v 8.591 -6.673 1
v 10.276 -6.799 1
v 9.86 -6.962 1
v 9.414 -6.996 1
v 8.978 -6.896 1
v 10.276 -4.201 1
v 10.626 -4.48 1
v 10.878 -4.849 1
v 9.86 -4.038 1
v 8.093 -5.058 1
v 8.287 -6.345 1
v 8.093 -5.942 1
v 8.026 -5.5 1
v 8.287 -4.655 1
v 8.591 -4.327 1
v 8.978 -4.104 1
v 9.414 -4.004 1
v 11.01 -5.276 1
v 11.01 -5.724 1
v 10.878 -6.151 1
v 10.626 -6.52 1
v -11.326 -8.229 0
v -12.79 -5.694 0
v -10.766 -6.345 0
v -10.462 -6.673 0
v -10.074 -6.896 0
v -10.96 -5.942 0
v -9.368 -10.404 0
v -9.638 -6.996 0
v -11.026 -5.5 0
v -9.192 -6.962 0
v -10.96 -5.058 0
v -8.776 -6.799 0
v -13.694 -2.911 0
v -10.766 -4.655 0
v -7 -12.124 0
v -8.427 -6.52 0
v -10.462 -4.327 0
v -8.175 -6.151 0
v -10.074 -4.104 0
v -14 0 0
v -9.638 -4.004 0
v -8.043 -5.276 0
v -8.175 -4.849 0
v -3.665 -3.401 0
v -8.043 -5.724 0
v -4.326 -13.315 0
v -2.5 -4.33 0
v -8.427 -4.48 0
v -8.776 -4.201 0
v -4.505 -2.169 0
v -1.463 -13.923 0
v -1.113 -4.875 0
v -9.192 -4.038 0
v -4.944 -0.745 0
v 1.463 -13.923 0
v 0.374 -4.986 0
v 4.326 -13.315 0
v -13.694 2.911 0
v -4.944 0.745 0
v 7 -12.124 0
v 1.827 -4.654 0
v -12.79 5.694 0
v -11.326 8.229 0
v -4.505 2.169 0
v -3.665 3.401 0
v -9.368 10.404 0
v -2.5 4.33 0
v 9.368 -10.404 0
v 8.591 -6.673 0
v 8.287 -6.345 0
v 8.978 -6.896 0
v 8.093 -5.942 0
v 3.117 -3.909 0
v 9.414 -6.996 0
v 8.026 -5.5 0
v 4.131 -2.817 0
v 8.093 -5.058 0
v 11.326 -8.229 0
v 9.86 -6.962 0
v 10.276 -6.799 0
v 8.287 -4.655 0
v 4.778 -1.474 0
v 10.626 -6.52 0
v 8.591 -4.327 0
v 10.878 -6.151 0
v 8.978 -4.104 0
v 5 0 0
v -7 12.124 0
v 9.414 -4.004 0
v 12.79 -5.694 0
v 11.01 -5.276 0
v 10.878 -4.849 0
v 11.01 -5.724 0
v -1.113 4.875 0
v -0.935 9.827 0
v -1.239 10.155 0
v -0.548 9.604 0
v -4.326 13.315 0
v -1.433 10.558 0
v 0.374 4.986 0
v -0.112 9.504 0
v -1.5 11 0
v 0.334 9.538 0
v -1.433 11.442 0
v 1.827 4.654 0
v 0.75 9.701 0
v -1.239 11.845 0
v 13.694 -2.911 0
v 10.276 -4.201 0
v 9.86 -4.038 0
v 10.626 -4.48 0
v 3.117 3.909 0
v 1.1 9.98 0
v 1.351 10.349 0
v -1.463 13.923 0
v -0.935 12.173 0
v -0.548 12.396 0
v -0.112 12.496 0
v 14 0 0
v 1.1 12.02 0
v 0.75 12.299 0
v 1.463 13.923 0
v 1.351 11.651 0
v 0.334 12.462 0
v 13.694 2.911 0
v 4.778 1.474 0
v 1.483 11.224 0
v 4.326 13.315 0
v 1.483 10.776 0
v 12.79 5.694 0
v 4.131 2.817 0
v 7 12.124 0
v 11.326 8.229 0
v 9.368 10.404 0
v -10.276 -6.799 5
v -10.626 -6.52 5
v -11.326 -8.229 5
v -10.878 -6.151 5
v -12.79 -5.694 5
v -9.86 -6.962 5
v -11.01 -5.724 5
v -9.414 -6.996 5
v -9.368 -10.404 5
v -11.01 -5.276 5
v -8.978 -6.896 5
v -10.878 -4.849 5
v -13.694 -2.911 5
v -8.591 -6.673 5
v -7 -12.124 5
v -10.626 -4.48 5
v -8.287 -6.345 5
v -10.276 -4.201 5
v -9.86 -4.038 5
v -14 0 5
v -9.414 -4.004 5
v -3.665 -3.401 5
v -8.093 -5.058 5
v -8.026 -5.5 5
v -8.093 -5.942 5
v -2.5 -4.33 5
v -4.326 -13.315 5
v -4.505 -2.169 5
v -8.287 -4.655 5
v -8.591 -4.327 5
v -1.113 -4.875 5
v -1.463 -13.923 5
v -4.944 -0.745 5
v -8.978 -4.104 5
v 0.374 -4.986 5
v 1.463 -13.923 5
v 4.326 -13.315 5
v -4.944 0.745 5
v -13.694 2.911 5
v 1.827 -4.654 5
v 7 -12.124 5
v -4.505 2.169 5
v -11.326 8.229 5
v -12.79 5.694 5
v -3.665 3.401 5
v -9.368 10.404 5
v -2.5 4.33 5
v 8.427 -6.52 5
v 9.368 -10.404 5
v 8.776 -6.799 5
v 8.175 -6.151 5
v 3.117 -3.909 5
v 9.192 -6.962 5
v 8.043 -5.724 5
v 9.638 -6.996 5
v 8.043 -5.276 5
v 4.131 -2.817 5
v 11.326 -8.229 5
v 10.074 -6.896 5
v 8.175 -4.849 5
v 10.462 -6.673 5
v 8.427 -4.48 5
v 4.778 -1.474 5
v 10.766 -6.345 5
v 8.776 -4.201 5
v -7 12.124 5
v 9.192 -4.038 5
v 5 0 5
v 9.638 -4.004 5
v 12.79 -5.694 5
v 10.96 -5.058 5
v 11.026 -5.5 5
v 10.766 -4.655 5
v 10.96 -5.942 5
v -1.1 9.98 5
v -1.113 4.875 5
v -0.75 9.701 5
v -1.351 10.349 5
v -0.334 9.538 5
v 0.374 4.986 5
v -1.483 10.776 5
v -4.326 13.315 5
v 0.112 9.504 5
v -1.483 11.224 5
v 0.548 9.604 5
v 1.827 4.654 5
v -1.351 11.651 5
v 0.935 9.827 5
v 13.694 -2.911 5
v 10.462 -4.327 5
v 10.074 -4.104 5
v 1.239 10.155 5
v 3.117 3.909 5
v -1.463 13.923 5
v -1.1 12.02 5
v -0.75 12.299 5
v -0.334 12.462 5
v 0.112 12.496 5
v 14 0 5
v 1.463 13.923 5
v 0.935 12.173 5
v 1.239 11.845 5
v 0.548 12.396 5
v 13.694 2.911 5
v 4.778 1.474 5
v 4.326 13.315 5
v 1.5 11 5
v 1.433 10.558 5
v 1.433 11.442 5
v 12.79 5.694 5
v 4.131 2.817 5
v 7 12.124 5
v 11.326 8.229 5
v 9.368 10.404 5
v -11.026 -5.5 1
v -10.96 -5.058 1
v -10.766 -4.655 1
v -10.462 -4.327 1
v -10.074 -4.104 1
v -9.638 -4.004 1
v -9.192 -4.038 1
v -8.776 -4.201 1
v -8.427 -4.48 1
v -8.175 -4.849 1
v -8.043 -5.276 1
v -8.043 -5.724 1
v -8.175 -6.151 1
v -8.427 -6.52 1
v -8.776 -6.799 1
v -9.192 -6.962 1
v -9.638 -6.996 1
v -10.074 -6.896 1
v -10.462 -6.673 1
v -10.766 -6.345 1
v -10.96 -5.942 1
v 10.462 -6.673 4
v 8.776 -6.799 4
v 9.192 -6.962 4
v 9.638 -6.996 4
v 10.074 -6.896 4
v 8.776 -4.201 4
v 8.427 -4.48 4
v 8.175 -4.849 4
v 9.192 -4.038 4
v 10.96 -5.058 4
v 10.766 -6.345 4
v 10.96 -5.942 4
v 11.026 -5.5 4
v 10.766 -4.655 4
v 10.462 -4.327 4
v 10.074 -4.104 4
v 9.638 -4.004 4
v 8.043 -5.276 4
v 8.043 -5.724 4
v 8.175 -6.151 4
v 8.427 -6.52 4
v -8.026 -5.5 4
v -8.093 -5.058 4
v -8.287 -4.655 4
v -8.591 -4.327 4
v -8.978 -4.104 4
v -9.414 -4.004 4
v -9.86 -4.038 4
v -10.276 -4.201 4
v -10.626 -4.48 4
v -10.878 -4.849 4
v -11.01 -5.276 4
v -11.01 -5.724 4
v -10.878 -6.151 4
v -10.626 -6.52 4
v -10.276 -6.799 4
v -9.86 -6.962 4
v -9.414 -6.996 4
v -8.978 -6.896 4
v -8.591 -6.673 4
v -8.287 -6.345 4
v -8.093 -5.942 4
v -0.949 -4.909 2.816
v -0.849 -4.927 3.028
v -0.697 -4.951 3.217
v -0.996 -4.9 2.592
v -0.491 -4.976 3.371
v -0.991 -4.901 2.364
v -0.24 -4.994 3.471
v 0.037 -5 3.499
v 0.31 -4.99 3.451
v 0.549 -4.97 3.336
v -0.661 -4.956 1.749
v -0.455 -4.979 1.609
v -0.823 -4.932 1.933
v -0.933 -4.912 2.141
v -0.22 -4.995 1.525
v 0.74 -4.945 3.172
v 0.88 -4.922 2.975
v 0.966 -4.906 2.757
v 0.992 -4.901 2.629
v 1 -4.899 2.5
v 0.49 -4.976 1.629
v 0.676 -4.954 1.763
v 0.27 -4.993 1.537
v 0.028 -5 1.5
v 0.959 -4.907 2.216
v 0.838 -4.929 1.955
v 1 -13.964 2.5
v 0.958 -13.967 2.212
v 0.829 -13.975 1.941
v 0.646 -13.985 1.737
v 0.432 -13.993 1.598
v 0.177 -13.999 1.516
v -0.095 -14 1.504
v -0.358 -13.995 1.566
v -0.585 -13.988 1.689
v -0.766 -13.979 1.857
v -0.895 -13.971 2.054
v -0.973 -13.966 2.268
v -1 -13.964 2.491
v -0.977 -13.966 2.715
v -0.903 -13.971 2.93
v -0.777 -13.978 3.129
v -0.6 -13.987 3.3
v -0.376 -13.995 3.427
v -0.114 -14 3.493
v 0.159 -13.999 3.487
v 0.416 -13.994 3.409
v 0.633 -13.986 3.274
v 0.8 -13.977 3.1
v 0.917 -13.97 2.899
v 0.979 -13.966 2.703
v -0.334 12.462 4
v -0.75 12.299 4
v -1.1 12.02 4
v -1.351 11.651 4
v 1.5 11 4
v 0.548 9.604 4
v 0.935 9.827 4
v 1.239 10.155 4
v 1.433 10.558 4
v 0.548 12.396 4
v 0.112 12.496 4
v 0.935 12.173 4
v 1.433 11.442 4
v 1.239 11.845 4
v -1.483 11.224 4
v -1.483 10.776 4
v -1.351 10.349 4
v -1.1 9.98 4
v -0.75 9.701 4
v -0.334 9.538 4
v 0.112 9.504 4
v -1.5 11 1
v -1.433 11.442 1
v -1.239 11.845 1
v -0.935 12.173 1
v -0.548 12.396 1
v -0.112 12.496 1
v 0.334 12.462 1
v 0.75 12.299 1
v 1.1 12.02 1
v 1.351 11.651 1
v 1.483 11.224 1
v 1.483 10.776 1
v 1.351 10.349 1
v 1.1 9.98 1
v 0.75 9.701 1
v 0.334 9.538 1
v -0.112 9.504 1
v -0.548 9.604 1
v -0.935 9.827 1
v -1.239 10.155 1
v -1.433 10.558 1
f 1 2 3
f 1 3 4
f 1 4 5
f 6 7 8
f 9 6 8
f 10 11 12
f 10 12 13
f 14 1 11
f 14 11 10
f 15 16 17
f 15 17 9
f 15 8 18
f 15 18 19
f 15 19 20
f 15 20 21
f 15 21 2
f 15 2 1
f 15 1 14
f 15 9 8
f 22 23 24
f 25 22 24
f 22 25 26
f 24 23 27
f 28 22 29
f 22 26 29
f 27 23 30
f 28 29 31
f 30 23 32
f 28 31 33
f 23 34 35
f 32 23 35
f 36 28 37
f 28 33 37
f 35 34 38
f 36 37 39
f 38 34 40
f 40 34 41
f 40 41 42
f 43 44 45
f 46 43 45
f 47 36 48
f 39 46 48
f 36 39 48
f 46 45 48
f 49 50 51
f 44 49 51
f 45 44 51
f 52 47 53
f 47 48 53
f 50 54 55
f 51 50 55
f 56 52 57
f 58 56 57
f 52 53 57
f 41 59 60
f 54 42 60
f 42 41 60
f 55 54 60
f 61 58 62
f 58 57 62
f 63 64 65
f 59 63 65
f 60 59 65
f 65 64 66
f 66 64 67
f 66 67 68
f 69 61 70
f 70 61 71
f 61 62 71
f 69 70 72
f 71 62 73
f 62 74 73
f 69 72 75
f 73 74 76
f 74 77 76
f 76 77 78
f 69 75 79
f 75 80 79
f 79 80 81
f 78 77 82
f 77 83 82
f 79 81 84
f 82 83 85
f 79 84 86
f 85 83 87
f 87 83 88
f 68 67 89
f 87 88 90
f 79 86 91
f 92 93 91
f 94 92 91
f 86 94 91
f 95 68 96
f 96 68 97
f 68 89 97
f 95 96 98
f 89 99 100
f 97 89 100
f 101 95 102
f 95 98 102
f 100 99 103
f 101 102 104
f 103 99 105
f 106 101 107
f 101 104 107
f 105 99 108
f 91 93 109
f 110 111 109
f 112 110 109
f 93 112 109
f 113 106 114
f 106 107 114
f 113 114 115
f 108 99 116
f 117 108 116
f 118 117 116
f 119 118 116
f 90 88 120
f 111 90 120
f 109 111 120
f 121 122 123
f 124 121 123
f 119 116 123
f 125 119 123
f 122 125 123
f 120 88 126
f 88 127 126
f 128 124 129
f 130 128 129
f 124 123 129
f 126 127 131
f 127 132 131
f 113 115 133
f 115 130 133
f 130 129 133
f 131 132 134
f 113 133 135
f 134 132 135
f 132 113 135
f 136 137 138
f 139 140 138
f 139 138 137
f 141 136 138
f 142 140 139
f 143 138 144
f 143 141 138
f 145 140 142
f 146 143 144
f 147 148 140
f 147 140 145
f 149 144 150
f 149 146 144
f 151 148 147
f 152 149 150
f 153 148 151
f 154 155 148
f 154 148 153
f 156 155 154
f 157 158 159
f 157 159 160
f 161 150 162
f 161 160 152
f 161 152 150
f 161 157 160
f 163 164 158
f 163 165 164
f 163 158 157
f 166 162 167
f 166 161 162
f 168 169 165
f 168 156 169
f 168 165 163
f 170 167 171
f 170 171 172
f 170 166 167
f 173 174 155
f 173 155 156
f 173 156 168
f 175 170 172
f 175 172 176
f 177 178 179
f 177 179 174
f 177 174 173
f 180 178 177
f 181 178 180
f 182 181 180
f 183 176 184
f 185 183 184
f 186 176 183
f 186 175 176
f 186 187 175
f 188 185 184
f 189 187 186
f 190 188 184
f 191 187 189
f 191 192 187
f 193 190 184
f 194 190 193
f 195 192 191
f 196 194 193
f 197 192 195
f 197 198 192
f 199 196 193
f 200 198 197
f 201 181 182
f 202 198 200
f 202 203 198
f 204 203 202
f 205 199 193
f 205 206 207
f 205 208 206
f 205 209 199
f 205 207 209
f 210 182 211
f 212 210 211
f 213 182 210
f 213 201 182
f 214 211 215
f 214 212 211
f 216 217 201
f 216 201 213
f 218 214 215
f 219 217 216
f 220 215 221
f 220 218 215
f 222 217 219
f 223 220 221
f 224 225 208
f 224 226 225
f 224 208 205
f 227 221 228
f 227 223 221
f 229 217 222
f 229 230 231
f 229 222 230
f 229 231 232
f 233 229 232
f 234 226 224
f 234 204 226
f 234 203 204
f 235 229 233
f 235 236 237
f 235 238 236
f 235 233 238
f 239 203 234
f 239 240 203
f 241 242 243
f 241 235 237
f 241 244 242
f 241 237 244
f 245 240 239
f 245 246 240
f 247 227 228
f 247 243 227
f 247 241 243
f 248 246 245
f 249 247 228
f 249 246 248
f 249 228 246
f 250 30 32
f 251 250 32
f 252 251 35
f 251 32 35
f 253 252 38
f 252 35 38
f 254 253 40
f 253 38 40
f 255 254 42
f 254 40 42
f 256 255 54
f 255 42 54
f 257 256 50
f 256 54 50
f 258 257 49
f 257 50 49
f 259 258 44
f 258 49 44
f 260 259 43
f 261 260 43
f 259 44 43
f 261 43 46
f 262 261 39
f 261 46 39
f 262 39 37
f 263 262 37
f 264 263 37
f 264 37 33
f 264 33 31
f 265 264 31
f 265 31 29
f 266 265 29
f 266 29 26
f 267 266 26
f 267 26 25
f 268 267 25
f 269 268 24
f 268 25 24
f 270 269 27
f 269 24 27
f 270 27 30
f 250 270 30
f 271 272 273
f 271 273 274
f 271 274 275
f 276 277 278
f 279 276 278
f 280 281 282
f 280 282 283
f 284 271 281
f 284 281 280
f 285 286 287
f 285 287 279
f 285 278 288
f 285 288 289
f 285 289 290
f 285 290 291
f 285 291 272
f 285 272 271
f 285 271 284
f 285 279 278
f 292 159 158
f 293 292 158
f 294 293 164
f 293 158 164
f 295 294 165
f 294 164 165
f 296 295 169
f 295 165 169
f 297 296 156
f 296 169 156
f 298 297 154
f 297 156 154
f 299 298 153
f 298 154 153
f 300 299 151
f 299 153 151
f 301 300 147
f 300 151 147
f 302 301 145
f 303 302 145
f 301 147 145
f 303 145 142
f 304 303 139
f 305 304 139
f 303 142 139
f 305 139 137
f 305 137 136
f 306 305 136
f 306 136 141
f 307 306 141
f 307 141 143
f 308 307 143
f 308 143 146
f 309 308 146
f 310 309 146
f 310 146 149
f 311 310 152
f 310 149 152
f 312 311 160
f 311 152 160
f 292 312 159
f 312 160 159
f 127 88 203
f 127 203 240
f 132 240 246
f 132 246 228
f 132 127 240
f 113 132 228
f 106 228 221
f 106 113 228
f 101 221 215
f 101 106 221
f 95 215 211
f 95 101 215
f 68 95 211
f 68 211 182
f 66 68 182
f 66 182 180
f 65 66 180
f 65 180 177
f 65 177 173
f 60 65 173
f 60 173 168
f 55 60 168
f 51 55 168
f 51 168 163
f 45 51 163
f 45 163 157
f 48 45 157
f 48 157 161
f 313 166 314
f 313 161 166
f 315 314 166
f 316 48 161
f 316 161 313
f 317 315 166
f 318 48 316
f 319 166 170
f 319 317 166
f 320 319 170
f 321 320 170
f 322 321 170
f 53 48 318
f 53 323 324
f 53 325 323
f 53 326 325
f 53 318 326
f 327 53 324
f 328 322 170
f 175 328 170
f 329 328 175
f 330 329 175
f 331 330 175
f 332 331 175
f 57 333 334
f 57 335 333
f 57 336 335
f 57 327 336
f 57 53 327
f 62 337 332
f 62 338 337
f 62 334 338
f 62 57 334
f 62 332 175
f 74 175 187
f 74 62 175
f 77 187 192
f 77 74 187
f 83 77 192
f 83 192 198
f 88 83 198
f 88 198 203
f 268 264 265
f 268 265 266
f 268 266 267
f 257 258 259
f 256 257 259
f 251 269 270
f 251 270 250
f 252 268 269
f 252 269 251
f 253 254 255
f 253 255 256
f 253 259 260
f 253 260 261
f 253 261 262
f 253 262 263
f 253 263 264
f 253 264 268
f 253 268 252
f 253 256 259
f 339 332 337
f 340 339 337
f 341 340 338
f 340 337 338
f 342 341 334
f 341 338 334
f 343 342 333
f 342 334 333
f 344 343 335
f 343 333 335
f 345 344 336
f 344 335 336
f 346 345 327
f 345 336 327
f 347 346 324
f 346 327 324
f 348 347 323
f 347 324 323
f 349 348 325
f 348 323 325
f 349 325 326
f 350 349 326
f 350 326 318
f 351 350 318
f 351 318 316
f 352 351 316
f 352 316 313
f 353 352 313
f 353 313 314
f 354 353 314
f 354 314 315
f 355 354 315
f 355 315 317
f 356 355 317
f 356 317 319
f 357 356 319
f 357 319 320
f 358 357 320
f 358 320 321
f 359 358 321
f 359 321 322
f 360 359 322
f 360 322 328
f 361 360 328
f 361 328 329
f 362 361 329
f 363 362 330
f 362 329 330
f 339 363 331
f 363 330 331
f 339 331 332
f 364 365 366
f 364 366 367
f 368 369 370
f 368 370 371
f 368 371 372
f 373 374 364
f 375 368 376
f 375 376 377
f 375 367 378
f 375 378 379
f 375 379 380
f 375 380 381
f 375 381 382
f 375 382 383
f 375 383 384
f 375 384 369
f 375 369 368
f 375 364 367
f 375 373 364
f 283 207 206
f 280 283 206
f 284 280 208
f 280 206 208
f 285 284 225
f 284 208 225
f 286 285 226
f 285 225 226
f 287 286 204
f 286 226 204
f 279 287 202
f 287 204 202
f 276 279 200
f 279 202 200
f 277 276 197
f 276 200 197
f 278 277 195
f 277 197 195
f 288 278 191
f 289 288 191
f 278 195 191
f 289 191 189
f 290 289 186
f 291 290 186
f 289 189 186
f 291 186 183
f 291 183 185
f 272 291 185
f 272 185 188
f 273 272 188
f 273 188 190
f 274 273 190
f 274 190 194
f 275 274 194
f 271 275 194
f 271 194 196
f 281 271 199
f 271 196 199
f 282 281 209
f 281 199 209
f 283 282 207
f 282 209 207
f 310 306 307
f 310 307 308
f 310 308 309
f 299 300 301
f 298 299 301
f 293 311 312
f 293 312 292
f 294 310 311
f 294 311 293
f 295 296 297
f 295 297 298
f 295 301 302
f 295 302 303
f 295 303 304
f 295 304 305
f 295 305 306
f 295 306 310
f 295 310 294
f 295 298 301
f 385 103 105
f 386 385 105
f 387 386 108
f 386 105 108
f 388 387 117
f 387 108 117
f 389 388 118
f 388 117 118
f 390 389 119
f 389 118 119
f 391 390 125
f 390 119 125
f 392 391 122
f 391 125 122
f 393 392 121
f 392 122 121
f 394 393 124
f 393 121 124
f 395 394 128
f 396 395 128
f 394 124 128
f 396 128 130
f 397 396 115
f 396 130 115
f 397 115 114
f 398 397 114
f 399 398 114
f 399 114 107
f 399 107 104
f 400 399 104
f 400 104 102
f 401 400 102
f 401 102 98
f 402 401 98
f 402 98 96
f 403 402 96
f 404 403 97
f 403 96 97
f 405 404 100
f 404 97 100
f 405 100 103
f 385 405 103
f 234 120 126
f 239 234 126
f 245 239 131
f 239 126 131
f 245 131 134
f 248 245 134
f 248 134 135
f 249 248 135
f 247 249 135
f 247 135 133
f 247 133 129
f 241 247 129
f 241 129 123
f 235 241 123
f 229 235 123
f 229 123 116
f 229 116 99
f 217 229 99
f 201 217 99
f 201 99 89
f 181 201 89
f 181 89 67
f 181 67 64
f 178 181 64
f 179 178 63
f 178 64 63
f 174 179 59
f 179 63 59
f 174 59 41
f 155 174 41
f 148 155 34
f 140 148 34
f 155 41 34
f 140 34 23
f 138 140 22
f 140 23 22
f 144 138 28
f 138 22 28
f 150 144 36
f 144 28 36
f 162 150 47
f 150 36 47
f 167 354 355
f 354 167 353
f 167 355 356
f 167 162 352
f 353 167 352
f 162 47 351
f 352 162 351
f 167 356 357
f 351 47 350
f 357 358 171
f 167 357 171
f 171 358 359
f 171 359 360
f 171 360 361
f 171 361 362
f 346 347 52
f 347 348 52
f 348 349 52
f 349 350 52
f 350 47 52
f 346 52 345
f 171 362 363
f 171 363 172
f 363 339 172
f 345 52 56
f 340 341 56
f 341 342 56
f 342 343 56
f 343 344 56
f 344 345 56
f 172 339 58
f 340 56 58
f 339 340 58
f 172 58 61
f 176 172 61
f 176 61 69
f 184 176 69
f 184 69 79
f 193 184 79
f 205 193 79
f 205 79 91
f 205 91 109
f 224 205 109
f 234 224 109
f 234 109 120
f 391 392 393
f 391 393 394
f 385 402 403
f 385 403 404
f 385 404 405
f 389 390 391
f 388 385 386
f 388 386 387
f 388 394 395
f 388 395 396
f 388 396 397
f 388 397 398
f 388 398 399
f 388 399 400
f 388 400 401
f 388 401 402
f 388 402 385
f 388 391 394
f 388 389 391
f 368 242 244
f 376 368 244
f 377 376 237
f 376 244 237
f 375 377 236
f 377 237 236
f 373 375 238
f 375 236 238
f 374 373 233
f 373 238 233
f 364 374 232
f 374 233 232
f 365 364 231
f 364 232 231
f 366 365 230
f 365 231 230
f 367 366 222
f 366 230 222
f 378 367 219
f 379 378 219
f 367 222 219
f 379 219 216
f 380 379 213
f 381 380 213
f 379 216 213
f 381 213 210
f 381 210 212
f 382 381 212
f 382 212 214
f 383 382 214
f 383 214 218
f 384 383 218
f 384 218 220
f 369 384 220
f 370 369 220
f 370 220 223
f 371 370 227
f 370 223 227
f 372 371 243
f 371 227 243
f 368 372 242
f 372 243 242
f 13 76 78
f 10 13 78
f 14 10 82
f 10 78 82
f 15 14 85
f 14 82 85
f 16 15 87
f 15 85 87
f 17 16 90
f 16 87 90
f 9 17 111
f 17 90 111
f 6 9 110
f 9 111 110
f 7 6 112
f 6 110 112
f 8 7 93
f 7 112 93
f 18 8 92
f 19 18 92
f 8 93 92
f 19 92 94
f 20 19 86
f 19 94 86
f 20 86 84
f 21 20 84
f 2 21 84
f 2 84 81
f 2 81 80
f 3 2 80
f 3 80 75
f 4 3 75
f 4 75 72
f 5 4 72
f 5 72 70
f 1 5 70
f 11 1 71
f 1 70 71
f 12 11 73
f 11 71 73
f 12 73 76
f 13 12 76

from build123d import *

# Parameters (mm, degrees)
SKETCH3_R           = 14
SKETCH3_R_2         = 5
BOSS_EXTRUDE1_DEPTH = 5
SKETCH4_R           = 1.5
CUT_EXTRUDE1_DEPTH  = 1
SKETCH5_R           = 1.5
CUT_EXTRUDE2_DEPTH  = 1
SKETCH6_R           = 1
CUT_EXTRUDE3_DEPTH  = 30


with BuildPart() as part:
    # Sketch3 → Boss-Extrude1 (new body)
    with BuildSketch(Plane.XY):
        Circle(SKETCH3_R)
        Circle(SKETCH3_R_2, mode=Mode.SUBTRACT)
    extrude(amount=BOSS_EXTRUDE1_DEPTH)

    # Sketch4 → Cut-Extrude1 (cut)
    with BuildSketch(Plane.XY.offset(5)):
        with Locations((0, 11)):
            Circle(SKETCH4_R)
        with Locations((9.526279442, -5.5)):
            Circle(SKETCH4_R)
        with Locations((-9.526279442, -5.5)):
            Circle(SKETCH4_R)
    extrude(amount=-CUT_EXTRUDE1_DEPTH, mode=Mode.SUBTRACT)

    # Sketch5 → Cut-Extrude2 (cut)
    with BuildSketch(Plane(origin=(0, 0, 0), x_dir=(-1, 0, 0), z_dir=(0, 0, -1))):
        with Locations((0, 11)):
            Circle(SKETCH5_R)
        with Locations((9.526279442, -5.5)):
            Circle(SKETCH5_R)
        with Locations((-9.526279442, -5.5)):
            Circle(SKETCH5_R)
    extrude(amount=-CUT_EXTRUDE2_DEPTH, mode=Mode.SUBTRACT)

    # Sketch6 → Cut-Extrude3 (cut)
    with BuildSketch(Plane(origin=(0, 0, 0), x_dir=(1, 0, 0), z_dir=(0, 1, 0))):
        with Locations((0, -2.5)):
            Circle(SKETCH6_R)
    extrude(amount=-CUT_EXTRUDE3_DEPTH, mode=Mode.SUBTRACT)


solid = part.part
